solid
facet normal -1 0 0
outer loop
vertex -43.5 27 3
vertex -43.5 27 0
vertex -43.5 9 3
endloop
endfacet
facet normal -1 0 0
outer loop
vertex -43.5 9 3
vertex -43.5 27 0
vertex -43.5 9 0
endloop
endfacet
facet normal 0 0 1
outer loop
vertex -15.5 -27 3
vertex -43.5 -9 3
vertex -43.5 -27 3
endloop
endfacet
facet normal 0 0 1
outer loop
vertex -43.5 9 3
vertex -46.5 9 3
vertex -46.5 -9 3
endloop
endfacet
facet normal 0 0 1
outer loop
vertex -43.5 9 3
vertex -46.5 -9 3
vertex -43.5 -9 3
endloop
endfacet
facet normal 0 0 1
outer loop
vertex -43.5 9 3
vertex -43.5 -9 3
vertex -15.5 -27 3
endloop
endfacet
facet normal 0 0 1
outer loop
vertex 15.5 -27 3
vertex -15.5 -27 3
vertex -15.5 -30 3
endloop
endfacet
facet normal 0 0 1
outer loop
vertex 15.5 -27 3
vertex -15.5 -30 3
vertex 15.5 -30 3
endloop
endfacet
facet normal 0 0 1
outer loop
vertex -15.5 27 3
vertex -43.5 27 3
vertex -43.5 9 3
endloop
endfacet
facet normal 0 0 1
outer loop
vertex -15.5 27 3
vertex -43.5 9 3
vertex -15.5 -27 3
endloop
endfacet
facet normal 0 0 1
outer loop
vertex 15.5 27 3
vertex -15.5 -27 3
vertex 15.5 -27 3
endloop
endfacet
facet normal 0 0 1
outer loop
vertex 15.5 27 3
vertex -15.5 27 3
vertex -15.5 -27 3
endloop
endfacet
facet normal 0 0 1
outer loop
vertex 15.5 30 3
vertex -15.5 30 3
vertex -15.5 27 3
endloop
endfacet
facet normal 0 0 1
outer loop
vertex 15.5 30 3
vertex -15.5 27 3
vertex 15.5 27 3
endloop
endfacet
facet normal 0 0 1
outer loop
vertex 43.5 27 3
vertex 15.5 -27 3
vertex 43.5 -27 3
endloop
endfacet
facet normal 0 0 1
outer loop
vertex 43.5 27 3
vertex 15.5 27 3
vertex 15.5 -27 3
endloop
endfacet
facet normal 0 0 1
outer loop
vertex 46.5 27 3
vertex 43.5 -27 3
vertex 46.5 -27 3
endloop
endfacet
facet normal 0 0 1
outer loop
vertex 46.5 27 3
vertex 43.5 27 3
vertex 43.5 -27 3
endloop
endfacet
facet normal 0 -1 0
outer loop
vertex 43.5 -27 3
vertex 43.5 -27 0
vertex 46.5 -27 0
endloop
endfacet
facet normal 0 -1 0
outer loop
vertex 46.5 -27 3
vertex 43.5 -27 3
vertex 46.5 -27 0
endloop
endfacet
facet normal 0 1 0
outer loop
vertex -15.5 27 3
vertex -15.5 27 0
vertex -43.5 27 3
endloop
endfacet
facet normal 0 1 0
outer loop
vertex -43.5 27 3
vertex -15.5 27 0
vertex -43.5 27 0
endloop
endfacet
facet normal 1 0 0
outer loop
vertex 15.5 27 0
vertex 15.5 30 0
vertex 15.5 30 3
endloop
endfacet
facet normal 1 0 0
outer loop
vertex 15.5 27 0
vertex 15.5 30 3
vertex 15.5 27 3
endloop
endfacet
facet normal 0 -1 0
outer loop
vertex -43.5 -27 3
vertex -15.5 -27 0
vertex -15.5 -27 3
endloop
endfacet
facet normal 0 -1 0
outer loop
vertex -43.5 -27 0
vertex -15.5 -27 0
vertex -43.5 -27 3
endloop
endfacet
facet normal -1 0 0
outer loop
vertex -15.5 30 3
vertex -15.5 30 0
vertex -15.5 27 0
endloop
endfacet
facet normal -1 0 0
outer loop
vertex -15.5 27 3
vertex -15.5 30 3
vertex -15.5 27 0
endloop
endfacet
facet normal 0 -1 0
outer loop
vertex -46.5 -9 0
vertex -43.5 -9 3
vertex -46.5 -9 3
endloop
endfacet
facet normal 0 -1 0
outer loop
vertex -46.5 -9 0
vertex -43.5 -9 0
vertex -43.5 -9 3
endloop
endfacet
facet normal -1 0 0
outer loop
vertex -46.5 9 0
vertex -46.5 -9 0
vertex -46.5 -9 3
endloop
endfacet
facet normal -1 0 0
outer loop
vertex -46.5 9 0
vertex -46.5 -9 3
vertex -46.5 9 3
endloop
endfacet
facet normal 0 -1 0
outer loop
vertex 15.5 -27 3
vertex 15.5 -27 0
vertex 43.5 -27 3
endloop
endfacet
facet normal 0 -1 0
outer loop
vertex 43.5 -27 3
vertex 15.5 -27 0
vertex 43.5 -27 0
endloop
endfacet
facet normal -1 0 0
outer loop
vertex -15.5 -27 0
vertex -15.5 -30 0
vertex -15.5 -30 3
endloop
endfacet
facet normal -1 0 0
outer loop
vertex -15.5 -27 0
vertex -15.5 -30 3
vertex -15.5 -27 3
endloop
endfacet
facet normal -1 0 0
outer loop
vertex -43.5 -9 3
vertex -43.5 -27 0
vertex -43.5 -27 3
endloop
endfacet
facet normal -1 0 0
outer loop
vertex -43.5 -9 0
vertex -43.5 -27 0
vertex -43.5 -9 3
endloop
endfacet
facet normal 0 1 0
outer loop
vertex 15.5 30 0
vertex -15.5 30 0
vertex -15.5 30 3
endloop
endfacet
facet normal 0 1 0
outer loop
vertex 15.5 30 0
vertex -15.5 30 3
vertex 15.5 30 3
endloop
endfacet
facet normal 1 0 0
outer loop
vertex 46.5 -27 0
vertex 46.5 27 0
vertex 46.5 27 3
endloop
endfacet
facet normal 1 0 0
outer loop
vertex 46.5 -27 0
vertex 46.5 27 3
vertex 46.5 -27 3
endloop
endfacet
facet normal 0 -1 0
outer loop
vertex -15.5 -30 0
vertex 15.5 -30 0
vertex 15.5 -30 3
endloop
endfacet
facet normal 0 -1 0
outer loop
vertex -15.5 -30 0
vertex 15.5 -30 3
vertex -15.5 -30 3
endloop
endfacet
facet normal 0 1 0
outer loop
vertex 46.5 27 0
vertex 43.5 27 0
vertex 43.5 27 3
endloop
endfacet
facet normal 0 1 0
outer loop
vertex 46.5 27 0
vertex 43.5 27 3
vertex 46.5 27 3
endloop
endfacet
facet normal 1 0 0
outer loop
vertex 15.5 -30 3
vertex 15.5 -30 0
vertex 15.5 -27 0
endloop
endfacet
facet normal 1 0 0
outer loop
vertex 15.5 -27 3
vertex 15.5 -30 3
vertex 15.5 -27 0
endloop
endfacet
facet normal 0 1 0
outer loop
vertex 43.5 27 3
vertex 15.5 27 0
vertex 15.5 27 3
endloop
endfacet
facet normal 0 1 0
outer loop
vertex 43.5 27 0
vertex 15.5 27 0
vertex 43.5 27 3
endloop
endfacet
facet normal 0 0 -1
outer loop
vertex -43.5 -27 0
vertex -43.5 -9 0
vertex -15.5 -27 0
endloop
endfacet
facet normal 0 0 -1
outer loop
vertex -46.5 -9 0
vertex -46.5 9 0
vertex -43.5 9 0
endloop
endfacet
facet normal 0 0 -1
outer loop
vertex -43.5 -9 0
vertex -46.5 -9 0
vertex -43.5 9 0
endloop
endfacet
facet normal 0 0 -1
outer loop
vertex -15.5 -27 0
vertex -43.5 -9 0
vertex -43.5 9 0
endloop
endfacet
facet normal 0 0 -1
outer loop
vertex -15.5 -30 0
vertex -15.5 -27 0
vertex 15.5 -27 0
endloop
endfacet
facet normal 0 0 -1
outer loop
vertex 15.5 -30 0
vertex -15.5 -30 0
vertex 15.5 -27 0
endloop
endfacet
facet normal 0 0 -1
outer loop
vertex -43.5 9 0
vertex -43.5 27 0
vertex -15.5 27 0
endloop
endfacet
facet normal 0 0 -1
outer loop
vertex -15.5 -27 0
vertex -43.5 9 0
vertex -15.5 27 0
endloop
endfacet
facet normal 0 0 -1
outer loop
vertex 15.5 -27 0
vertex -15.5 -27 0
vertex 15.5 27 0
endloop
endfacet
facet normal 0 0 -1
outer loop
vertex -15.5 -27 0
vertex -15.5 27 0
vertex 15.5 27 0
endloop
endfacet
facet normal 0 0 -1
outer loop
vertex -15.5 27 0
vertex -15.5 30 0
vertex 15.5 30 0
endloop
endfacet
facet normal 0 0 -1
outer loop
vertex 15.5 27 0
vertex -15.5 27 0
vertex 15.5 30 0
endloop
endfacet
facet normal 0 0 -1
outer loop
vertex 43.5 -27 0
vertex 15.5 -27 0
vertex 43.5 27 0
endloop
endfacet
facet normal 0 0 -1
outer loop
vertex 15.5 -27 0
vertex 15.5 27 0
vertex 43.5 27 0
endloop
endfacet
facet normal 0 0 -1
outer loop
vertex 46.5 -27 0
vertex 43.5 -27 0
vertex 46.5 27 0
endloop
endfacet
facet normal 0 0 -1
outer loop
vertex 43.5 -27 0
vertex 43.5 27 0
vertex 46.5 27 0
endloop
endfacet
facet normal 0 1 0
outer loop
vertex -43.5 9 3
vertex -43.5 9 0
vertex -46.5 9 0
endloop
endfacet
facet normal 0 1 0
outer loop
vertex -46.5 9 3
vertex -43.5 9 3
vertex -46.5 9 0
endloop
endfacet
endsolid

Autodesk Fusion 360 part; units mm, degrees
sketch "Sketch1" plane through (0, 0, 0) normal (0, 0, 1) x (1, 0, 0)
  line L0 (-46.5, 30) -> (46.5, 30)
  line L1 (46.5, 30) -> (46.5, -30)
  line L2 (46.5, -30) -> (-46.5, -30)
  line L3 (-46.5, -30) -> (-46.5, 30)
  line L4 (-46.5, 30) -> (46.5, -30) construction
  line L5 (46.5, 30) -> (-46.5, -30) construction
  line L6 (-46.5, 30) -> (-15.5, 30)
  line L7 (-15.5, 30) -> (-15.5, 27)
  line L8 (-15.5, 27) -> (-46.5, 27)
  line L9 (-46.5, 27) -> (-46.5, 30)
  line L10 (-46.5, -30) -> (-15.5, -30)
  line L11 (-15.5, -30) -> (-15.5, -27)
  line L12 (-15.5, -27) -> (-46.5, -27)
  line L13 (-46.5, -27) -> (-46.5, -30)
  line L14 (46.5, 30) -> (15.5, 30)
  line L15 (15.5, 30) -> (15.5, 27)
  line L16 (15.5, 27) -> (46.5, 27)
  line L17 (46.5, 27) -> (46.5, 30)
  line L18 (46.5, -30) -> (15.5, -30)
  line L19 (15.5, -30) -> (15.5, -27)
  line L20 (15.5, -27) -> (46.5, -27)
  line L21 (46.5, -27) -> (46.5, -30)
  line L22 (46.5, 30) -> (43.5, 30)
  line L23 (43.5, 30) -> (43.5, 27)
  line L24 (43.5, 27) -> (46.5, 27)
  line L25 (46.5, 27) -> (46.5, 30)
  line L26 (46.5, -30) -> (43.5, -30)
  line L27 (43.5, -30) -> (43.5, -27)
  line L28 (43.5, -27) -> (46.5, -27)
  line L29 (46.5, -27) -> (46.5, -30)
  line L30 (-46.5, 27) -> (-43.5, 27)
  line L31 (-43.5, 27) -> (-43.5, 9)
  line L32 (-43.5, 9) -> (-46.5, 9)
  line L33 (-46.5, 9) -> (-46.5, 27)
  line L34 (-46.5, -27) -> (-43.5, -27)
  line L35 (-43.5, -27) -> (-43.5, -9)
  line L36 (-43.5, -9) -> (-46.5, -9)
  line L37 (-46.5, -9) -> (-46.5, -27)
  dimension "d1" = 93
  dimension "d2" = 60
  dimension "d3" = 31
  dimension "d4" = 3
  dimension "d5" = 31
  dimension "d6" = 3
  dimension "d7" = 31
  dimension "d8" = 3
  dimension "d9" = 31
  dimension "d10" = 3
  dimension "d11" = 3
  dimension "d12" = 3
  dimension "d13" = 3
  dimension "d14" = 3
  dimension "d15" = 3
  dimension "d16" = 18
  dimension "d17" = 3
  dimension "d18" = 18
extrude "Extrude1" add sketch "Sketch1" along normal blind 3 contours L0 L1 L2 L3 L7 L8 L11 L12 L15 L16 L19 L20 L24 L28 L31 L32 L35 L36
sketch "Sketch2" plane through (0, 0, 3) normal (0, 0, 1) x (-1, 0, 0)
  line L0 (-15.5, 30) -> (-15.5, 27)
  line L1 (-15.5, 27) -> (-46.5, 27)
  line L2 (-46.5, 27) -> (-46.5, -27)
  line L3 (-46.5, -27) -> (-15.5, -27)
  line L4 (-15.5, -27) -> (-15.5, -30)
  line L5 (-15.5, -30) -> (15.5, -30)
  line L6 (15.5, -30) -> (15.5, -27)
  line L7 (15.5, -27) -> (43.5, -27)
  line L8 (43.5, -27) -> (43.5, -9)
  line L9 (43.5, -9) -> (46.5, -9)
  line L10 (46.5, -9) -> (46.5, 9)
  line L11 (46.5, 9) -> (43.5, 9)
  line L12 (43.5, 9) -> (43.5, 27)
  line L13 (43.5, 27) -> (15.5, 27)
  line L14 (15.5, 27) -> (15.5, 30)
  line L15 (15.5, 30) -> (-15.5, 30)
